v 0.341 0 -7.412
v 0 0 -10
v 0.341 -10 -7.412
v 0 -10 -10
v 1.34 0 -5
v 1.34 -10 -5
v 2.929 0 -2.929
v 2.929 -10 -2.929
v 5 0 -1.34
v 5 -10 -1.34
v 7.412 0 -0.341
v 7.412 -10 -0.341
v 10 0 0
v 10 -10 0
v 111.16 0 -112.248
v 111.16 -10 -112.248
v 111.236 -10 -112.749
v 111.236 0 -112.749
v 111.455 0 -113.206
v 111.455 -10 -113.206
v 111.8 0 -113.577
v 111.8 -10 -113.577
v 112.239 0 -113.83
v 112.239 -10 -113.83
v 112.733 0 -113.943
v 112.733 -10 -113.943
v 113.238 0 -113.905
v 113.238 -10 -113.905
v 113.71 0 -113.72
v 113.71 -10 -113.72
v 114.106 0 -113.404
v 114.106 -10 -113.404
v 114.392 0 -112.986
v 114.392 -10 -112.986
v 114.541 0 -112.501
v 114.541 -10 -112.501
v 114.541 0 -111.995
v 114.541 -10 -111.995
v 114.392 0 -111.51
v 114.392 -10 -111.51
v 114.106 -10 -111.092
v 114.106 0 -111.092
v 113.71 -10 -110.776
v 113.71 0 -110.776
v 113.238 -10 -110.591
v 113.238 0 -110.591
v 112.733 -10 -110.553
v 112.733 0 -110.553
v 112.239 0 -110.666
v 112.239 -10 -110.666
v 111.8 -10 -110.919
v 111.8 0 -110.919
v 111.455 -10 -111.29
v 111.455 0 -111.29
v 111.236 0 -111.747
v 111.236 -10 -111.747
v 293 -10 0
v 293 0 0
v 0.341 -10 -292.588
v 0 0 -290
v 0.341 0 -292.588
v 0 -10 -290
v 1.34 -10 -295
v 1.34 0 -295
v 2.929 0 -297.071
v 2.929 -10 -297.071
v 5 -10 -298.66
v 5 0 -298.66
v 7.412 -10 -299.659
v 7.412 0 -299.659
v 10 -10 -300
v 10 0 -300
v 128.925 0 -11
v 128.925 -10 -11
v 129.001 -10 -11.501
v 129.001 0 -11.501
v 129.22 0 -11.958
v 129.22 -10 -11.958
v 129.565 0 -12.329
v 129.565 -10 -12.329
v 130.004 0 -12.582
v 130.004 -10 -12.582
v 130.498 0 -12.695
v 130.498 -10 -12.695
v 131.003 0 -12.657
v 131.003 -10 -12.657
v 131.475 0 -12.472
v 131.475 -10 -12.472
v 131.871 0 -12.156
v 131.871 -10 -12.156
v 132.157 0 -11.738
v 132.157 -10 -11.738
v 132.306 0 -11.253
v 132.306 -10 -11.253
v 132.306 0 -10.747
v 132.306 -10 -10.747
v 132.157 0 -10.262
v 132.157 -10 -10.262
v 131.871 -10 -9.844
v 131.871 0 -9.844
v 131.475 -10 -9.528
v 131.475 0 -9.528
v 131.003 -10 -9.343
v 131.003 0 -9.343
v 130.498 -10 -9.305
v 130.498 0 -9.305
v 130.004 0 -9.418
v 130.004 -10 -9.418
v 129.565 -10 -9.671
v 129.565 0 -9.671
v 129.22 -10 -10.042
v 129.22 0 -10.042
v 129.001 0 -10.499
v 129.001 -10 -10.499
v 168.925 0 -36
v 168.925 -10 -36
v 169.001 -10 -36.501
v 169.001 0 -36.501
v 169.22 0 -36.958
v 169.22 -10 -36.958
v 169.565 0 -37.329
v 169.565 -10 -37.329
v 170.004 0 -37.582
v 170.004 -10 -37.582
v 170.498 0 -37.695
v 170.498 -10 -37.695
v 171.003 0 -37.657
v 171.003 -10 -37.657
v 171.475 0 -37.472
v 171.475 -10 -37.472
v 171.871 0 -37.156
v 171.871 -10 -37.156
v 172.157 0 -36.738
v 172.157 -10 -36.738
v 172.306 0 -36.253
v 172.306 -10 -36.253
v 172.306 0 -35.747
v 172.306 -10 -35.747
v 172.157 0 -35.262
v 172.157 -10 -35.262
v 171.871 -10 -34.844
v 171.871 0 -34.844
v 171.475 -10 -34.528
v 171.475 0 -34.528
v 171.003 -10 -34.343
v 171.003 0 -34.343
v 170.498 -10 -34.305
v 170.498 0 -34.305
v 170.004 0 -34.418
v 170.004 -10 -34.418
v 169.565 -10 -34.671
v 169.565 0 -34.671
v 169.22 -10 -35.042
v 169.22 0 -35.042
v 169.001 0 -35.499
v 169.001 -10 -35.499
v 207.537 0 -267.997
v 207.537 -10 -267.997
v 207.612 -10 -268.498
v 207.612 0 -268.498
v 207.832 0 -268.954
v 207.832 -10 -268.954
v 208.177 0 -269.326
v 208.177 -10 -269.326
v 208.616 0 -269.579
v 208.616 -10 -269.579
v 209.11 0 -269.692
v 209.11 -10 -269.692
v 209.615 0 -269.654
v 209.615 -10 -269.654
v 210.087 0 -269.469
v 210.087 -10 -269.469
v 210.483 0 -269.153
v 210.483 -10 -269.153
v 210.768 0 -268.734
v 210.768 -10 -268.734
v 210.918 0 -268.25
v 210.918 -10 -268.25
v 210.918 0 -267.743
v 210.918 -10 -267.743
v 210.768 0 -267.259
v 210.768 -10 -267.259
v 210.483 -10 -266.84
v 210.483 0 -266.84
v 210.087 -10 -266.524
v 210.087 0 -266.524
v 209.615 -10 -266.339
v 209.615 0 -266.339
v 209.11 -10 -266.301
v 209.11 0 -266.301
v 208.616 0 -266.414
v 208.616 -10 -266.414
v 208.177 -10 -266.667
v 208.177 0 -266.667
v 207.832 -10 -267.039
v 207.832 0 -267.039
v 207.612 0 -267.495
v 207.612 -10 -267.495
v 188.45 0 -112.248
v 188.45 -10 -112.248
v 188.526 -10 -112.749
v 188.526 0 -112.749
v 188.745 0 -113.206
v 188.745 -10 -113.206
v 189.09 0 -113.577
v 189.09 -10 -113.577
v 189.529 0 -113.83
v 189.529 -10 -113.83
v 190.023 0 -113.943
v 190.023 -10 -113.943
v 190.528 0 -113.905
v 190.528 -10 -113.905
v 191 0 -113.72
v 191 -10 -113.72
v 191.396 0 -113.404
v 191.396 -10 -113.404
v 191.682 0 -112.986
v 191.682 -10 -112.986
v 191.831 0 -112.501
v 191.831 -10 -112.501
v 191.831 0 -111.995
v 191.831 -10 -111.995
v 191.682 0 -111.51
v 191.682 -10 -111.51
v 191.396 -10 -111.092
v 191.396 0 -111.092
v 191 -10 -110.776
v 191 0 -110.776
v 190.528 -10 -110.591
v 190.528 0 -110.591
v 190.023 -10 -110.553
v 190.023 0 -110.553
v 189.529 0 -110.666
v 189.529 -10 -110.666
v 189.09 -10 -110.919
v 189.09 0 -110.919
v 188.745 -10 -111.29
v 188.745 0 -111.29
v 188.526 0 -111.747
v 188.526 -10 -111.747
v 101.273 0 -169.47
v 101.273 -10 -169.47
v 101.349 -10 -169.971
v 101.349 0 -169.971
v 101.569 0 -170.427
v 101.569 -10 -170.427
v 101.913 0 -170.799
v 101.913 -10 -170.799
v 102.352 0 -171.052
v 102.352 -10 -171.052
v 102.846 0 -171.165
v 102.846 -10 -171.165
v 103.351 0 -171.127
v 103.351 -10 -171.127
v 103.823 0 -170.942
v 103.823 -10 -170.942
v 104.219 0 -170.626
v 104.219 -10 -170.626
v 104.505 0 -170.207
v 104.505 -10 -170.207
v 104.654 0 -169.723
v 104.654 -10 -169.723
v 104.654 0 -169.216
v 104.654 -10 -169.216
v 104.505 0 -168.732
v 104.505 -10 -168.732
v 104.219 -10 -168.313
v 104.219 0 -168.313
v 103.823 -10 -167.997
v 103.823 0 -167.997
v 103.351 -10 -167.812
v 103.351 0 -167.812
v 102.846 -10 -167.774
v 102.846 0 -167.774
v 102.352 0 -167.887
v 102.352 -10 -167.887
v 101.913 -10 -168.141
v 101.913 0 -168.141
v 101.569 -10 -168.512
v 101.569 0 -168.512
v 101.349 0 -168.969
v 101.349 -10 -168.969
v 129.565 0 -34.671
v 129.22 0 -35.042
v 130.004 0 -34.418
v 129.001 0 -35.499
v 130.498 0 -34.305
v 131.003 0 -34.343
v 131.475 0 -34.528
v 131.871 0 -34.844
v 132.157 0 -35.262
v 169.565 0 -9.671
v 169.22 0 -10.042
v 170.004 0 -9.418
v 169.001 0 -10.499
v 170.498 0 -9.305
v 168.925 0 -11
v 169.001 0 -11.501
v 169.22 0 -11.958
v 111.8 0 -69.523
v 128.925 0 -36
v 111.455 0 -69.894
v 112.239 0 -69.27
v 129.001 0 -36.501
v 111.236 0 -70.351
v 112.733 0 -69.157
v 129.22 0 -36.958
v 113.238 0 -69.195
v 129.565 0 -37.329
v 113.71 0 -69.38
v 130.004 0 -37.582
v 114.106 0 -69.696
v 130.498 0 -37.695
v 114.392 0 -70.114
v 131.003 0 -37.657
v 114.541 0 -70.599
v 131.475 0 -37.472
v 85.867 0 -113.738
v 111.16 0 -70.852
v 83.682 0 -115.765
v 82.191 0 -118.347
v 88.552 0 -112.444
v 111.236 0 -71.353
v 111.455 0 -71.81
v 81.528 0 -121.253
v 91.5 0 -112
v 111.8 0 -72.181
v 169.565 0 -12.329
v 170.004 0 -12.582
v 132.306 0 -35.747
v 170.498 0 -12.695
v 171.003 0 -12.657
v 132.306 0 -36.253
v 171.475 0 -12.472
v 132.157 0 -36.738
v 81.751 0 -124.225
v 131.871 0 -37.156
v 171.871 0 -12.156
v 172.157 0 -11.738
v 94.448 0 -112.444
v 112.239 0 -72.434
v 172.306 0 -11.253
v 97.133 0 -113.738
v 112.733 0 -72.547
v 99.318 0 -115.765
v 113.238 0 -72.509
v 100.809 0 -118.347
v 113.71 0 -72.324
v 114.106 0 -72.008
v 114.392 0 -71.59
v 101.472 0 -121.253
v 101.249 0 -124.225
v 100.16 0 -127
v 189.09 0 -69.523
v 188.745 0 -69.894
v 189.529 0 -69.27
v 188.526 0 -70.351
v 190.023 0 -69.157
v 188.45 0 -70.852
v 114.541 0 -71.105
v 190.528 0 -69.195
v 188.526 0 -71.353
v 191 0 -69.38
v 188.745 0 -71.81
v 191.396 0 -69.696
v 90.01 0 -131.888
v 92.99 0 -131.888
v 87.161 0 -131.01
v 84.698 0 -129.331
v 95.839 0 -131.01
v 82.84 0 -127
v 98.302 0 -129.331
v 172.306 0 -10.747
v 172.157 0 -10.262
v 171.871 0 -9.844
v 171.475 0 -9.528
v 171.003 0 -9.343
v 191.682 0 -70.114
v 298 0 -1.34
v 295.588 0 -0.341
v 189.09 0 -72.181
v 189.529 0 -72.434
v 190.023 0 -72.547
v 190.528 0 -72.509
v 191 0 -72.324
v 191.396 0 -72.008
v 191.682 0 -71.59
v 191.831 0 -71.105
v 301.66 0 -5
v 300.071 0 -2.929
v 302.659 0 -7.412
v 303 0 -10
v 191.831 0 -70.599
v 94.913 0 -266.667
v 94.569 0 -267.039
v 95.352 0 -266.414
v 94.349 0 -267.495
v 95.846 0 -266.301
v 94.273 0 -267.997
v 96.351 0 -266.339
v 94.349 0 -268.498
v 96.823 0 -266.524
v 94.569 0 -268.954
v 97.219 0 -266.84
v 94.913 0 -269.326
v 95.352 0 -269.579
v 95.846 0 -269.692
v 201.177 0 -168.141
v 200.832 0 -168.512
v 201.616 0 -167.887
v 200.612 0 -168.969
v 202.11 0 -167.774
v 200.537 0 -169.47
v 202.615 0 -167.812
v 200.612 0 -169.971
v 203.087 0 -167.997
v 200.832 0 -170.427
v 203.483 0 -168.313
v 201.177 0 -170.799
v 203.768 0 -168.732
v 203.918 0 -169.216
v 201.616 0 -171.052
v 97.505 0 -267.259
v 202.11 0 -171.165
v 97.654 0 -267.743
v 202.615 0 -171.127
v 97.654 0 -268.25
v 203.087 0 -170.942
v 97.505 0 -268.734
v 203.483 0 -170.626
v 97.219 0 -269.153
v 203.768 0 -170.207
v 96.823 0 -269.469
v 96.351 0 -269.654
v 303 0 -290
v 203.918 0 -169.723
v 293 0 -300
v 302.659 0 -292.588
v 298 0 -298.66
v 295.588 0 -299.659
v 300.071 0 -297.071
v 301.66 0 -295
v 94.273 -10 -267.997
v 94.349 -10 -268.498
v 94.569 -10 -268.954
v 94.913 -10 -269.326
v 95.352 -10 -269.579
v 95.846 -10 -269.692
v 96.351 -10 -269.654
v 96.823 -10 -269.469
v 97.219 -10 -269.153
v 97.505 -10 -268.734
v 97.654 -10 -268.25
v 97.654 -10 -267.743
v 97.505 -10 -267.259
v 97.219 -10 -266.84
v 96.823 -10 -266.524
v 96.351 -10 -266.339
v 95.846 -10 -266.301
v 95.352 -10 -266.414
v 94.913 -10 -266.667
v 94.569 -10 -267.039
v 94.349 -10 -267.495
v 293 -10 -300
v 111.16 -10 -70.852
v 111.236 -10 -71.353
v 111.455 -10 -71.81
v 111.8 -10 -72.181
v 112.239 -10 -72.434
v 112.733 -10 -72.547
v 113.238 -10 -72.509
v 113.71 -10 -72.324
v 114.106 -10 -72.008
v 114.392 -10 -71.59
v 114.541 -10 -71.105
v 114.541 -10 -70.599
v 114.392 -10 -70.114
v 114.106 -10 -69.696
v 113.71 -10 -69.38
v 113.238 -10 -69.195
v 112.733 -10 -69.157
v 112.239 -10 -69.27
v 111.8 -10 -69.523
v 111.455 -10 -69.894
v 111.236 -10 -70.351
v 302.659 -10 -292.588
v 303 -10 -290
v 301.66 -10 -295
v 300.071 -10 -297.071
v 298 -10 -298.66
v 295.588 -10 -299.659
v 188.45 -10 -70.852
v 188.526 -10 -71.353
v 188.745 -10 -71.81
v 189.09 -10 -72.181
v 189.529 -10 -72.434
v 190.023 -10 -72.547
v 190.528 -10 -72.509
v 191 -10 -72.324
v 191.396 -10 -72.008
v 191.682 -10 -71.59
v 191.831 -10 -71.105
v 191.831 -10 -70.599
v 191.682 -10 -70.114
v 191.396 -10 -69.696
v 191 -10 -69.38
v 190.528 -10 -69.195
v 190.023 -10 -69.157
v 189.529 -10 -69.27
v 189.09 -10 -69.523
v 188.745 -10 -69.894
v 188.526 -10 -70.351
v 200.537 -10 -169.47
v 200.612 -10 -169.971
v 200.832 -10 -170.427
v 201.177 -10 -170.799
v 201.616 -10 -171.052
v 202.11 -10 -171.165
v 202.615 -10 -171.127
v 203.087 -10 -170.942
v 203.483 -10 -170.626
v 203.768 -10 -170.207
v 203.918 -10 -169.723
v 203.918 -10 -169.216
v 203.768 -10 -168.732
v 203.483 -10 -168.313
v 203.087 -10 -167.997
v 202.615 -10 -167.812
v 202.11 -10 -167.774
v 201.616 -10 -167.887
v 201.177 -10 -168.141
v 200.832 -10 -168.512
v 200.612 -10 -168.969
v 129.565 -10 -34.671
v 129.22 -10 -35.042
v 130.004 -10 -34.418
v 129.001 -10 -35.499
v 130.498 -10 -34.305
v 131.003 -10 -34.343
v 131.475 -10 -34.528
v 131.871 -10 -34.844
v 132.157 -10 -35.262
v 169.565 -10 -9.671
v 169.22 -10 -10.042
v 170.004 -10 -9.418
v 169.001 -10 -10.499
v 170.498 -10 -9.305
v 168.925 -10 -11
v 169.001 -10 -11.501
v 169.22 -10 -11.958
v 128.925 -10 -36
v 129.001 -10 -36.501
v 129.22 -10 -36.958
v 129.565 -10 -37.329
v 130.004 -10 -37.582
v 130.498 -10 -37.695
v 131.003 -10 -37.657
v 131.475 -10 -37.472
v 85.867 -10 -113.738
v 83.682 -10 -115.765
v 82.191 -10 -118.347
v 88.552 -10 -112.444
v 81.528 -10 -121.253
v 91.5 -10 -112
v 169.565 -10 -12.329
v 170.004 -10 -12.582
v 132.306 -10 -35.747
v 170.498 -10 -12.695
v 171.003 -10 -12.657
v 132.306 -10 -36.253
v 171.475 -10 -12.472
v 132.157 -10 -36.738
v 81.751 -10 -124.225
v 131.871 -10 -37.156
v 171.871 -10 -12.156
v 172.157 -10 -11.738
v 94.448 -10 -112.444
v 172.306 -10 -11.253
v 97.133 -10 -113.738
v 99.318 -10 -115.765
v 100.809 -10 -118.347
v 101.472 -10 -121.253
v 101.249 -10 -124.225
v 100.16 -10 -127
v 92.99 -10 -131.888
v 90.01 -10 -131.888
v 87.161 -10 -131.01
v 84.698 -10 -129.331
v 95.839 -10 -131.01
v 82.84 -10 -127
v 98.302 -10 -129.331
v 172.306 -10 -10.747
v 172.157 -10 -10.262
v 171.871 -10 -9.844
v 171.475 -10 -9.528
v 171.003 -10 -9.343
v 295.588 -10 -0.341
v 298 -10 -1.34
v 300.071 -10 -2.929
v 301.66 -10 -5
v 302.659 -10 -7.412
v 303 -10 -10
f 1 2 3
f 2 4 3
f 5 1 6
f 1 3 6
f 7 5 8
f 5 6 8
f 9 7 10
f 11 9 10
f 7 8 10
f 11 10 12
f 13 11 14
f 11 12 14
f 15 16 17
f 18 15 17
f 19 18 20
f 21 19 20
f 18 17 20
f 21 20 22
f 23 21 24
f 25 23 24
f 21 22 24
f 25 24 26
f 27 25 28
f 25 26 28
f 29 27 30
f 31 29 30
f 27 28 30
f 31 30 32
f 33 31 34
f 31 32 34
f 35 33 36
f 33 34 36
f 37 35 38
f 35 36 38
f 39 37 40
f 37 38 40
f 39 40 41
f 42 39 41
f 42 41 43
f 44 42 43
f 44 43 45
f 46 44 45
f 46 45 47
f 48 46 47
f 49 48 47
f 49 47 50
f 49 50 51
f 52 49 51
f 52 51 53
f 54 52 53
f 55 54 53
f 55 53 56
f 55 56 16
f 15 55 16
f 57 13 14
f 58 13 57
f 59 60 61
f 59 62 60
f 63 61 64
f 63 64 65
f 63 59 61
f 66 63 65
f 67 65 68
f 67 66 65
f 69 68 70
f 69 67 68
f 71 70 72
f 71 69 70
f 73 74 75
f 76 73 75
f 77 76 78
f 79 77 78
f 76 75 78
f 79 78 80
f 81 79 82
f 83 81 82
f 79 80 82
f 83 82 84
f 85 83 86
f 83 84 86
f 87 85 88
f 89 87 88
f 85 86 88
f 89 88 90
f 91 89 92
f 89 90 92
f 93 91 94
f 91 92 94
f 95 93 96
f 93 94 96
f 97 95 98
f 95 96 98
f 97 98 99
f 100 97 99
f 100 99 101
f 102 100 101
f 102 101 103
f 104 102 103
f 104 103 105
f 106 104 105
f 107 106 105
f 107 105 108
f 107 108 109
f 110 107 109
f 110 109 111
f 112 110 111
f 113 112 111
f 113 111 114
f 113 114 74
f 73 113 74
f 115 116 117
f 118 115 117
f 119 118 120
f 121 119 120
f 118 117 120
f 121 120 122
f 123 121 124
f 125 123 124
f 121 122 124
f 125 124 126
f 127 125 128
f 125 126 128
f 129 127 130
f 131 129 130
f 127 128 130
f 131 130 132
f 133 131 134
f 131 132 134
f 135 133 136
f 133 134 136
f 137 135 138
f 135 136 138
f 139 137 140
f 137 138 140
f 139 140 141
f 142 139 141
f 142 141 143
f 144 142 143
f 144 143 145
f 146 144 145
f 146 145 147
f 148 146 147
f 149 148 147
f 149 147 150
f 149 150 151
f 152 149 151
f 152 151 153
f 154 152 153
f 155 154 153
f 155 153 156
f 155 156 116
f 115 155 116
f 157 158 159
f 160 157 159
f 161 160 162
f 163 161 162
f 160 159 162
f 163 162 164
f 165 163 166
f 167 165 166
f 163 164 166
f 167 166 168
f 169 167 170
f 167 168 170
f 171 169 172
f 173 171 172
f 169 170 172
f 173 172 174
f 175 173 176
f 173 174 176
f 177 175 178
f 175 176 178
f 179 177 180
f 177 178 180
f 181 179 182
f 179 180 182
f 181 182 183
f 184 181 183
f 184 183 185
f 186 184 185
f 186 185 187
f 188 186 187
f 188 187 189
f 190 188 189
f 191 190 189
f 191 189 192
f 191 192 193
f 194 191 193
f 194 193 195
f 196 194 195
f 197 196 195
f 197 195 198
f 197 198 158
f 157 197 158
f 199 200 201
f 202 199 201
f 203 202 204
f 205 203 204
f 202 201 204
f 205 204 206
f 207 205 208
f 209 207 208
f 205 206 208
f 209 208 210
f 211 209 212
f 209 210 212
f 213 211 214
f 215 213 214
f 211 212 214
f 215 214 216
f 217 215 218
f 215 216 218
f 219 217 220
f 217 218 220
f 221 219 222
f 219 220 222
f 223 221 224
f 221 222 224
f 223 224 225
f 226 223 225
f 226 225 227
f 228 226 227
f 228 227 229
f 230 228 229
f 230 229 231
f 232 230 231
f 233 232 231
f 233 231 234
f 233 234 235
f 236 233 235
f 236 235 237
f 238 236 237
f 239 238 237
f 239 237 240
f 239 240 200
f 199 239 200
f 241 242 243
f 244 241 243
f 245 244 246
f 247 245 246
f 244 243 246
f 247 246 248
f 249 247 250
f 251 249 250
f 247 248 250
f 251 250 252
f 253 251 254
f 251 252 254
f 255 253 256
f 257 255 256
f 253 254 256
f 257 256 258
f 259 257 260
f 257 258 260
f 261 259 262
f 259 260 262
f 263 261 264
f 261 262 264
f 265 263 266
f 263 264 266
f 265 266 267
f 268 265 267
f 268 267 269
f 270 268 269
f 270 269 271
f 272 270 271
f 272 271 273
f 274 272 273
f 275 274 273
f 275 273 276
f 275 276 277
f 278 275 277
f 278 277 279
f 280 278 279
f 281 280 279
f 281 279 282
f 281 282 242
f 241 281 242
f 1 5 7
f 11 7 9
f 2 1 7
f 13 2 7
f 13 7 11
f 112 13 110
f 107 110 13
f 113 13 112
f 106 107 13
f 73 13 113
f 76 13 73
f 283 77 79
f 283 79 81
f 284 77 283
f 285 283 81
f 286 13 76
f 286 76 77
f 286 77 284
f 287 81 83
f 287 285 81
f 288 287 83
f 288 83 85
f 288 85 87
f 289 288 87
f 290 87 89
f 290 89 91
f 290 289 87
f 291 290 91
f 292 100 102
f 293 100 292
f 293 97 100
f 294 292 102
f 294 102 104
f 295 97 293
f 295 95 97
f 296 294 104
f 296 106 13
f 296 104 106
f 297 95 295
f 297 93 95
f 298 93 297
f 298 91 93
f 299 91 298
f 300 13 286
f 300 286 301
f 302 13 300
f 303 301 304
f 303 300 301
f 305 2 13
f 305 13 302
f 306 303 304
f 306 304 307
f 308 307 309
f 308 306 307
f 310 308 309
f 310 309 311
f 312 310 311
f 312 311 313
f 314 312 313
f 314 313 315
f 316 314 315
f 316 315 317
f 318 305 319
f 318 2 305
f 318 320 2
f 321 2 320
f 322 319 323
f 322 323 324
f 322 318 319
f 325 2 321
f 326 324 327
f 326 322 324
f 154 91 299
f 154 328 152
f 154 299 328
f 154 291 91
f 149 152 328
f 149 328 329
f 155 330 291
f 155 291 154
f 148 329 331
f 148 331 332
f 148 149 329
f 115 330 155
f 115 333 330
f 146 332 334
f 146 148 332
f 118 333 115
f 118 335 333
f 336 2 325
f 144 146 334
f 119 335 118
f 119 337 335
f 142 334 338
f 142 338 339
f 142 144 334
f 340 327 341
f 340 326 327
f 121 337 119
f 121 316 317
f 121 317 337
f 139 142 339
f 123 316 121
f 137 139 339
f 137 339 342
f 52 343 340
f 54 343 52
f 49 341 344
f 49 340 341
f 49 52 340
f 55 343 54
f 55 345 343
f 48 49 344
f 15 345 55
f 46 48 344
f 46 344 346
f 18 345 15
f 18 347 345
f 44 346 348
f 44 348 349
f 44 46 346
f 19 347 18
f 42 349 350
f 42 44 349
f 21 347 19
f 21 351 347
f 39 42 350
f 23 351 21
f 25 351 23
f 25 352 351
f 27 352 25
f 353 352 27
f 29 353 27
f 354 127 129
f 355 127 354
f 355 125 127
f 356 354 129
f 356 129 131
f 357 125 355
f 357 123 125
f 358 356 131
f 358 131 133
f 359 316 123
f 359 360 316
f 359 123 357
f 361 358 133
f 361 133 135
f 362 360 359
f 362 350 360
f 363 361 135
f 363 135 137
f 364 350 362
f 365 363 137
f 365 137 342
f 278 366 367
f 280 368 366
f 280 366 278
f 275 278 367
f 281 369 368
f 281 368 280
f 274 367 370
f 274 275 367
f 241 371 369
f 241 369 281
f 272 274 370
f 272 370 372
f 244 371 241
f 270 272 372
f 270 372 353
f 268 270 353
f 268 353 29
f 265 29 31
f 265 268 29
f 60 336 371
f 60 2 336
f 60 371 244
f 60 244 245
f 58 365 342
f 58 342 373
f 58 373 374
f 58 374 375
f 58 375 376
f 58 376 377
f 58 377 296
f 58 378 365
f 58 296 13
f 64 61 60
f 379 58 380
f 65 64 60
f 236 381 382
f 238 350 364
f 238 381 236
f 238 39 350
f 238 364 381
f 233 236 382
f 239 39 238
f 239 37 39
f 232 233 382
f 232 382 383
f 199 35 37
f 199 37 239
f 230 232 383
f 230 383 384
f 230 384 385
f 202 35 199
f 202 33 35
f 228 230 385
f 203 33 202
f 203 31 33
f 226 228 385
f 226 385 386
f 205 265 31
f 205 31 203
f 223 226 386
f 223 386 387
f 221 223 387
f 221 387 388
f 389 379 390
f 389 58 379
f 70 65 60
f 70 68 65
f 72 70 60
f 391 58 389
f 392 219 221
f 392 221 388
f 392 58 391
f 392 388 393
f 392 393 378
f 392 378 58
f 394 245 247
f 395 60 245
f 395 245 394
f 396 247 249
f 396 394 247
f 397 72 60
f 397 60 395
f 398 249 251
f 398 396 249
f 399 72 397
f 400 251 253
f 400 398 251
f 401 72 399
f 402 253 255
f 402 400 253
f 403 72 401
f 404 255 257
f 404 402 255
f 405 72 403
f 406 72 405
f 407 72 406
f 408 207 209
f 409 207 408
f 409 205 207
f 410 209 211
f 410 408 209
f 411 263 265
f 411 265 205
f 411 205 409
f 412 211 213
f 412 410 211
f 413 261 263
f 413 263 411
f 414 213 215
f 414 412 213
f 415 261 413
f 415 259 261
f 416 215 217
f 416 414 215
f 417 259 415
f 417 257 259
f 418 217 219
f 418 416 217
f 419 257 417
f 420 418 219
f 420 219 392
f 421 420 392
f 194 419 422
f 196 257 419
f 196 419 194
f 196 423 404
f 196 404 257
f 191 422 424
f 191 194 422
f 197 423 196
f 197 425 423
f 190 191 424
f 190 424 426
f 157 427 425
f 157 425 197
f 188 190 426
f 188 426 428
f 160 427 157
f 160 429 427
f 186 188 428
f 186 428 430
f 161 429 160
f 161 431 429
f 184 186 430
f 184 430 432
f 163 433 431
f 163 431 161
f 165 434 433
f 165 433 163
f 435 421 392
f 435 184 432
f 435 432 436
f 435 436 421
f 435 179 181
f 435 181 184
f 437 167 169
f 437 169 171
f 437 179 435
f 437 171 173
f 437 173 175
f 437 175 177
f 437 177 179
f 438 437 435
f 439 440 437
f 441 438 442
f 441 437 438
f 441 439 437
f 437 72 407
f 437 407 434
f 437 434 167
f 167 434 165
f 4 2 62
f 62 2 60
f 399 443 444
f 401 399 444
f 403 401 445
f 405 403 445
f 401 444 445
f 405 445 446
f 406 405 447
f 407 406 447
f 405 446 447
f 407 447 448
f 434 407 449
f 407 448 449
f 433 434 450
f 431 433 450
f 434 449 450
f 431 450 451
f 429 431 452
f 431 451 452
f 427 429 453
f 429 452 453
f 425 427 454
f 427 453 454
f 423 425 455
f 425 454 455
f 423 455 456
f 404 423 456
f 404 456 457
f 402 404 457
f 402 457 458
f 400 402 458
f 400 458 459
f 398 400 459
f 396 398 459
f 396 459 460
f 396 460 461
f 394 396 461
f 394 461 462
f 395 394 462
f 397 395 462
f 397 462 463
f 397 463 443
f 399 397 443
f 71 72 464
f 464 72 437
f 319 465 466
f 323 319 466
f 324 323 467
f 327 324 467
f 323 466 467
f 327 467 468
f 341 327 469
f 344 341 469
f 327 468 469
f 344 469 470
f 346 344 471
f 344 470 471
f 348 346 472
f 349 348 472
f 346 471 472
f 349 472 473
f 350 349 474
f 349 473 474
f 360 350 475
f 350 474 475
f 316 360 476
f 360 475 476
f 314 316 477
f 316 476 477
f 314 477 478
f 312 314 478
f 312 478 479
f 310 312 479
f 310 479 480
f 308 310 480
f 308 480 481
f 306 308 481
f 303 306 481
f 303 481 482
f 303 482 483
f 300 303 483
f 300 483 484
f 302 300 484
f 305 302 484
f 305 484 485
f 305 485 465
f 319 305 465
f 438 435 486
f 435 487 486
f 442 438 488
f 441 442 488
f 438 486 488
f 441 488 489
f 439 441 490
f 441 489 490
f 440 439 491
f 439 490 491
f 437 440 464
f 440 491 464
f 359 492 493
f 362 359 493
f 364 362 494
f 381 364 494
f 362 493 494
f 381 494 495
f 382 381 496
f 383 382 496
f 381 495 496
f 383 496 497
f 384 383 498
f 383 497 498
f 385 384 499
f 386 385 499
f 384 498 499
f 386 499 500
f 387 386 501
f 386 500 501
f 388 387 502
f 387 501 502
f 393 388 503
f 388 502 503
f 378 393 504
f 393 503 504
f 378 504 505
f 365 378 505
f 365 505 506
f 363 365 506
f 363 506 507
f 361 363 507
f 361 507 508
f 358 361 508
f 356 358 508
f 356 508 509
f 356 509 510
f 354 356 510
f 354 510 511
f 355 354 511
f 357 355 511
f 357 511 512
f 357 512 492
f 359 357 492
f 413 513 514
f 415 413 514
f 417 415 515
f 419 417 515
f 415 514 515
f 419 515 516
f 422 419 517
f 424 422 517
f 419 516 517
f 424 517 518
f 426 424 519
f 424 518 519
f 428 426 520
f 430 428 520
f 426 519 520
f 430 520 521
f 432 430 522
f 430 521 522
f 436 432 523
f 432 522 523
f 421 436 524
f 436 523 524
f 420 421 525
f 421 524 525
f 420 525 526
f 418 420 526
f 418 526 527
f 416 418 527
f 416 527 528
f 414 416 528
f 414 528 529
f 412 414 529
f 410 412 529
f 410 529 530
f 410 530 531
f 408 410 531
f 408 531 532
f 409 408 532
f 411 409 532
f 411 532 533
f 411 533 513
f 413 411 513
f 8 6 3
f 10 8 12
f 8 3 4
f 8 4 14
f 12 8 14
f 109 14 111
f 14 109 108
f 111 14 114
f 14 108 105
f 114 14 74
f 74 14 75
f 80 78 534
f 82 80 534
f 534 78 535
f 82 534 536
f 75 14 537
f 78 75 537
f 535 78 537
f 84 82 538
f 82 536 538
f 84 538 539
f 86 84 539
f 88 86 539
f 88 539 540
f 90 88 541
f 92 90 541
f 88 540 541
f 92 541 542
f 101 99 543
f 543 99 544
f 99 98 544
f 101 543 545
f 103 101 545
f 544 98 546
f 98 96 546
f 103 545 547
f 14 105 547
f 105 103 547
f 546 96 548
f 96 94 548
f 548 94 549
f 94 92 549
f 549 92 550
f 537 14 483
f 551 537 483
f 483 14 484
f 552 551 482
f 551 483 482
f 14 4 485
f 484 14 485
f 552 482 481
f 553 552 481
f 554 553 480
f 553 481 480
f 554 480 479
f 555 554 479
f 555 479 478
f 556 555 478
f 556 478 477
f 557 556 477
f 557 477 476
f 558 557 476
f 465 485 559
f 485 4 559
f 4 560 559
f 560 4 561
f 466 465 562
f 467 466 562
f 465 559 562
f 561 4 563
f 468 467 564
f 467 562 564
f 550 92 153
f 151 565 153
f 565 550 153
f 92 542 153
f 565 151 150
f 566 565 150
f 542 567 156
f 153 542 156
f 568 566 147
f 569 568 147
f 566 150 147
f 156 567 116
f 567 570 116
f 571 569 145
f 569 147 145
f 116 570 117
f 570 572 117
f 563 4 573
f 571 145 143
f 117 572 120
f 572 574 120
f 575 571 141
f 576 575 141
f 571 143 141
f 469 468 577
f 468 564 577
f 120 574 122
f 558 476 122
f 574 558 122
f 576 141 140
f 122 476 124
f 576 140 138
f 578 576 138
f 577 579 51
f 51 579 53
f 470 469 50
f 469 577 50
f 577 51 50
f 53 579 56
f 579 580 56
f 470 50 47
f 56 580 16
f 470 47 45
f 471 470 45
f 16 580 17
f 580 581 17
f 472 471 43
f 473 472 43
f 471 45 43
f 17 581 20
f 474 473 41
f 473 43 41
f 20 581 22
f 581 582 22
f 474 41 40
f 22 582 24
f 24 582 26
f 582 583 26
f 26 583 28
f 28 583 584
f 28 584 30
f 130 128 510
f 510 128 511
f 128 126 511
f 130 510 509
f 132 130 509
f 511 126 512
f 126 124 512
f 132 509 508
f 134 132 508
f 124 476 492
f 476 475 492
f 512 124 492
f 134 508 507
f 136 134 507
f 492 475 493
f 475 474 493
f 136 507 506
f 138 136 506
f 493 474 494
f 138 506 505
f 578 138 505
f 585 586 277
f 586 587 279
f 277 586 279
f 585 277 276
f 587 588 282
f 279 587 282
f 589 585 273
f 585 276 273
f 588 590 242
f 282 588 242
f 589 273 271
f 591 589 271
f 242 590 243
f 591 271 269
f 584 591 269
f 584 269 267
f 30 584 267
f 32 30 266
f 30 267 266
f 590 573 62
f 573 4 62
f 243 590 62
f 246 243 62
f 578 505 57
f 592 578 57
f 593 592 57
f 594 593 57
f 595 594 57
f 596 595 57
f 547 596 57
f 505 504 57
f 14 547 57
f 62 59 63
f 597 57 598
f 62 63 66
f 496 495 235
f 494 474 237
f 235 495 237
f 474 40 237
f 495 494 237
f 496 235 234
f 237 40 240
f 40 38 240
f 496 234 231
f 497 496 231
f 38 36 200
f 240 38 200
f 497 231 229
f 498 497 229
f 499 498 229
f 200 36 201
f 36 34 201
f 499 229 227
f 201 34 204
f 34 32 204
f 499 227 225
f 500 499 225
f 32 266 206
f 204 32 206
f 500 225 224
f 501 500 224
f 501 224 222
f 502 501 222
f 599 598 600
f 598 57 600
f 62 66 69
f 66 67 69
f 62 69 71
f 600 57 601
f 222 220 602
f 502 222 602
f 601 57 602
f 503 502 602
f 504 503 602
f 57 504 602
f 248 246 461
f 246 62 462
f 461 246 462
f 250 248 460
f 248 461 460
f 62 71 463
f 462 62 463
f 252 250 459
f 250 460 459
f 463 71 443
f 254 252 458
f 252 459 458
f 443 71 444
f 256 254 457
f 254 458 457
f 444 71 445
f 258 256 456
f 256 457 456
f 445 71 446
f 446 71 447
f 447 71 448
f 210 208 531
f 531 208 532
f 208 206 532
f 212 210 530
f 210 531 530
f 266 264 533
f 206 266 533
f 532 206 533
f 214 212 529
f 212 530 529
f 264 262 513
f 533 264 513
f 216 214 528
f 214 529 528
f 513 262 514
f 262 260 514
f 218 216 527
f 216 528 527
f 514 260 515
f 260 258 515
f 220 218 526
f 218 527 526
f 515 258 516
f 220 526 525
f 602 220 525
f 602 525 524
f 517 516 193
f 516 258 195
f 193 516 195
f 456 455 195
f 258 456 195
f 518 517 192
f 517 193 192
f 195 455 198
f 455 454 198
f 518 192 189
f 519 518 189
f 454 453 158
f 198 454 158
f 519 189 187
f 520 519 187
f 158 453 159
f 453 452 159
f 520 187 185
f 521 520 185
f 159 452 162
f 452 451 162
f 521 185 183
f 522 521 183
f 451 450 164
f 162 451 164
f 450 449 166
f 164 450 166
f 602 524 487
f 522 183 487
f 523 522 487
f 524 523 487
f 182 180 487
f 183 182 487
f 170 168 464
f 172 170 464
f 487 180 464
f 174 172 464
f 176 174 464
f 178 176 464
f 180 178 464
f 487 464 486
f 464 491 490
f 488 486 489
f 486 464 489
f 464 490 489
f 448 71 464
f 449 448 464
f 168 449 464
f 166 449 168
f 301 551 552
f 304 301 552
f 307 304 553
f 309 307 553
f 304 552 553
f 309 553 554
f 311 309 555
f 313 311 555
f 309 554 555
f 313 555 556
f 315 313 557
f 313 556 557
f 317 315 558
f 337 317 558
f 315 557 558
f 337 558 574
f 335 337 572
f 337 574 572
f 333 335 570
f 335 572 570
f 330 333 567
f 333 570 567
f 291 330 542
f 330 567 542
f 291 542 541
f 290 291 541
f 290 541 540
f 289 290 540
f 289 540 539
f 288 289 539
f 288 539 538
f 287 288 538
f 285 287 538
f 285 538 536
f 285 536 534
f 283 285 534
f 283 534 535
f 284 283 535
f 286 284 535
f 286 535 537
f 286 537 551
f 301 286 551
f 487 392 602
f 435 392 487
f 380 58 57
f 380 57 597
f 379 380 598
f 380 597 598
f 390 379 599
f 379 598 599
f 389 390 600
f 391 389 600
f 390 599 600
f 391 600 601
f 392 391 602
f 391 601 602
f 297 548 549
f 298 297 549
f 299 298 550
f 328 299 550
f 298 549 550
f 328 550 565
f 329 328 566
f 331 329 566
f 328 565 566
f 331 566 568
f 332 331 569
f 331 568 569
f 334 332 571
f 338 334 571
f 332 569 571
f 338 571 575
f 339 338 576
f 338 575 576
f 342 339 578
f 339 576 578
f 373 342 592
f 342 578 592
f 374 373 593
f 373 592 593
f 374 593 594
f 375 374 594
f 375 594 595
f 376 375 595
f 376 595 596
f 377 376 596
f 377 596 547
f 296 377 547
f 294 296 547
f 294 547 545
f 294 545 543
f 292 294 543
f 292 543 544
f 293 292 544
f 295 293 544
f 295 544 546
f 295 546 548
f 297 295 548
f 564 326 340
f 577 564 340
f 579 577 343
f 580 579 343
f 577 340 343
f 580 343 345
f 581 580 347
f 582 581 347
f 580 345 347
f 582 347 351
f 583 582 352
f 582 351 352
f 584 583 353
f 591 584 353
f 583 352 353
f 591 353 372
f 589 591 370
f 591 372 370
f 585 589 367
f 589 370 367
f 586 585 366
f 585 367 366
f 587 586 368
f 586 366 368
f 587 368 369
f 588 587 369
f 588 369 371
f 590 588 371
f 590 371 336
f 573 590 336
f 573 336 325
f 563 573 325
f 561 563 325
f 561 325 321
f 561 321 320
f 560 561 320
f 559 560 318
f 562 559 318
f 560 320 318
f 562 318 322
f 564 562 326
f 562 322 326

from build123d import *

# Parameters (mm, degrees)
SKETCH1_W                = 303
SKETCH1_H                = 300
BASE_FLANGE1_DEPTH       = 10
FILLET1_R                = 10
M3_CLEARANCE_HOLE1_D     = 3.4
M3_CLEARANCE_HOLE1_DEPTH = 50
M3_CLEARANCE_HOLE1_TIP   = 1.021463052
M3_CLEARANCE_HOLE2_D     = 3.4
M3_CLEARANCE_HOLE2_DEPTH = 28.71
M3_CLEARANCE_HOLE2_TIP   = 1.021463052
WIREHOLE_R               = 10
CUT_EXTRUDE1_DEPTH       = 10
M3_CLEARANCE_HOLE3_D     = 3.4
M3_CLEARANCE_HOLE3_DEPTH = 28.71
M3_CLEARANCE_HOLE3_TIP   = 1.021463052


# Sheet-metal steps are written as plain solids
with BuildPart() as part:
    # Sketch1 → Base-Flange1 (new body)
    with BuildSketch(Plane(origin=(0, 0, 0), x_dir=(1, 0, 0), z_dir=(0, 1, 0))):
        with Locations((151.5, 150)):
            Rectangle(SKETCH1_W, SKETCH1_H)
    extrude(amount=-BASE_FLANGE1_DEPTH)

    # Fillet1
    fillet1_edges = [part.edges().sort_by_distance(p)[0] for p in [
        (0, -5, -300),
        (303, -5, -300),
        (303, -5, 0),
        (0, -5, 0),
    ]]
    fillet(fillet1_edges, radius=FILLET1_R)

    # M3 Clearance Hole1
    with Locations(Plane(origin=(0, 0, 0), x_dir=(1, 0, 0), z_dir=(0, 1, 0))):
        with Locations((202.2366, 169.469739333), (102.9732, 169.469739333), (95.9732, 267.996539333), (209.2366, 267.996539333)):
            Hole(M3_CLEARANCE_HOLE1_D / 2, depth=M3_CLEARANCE_HOLE1_DEPTH)
            with Locations((0, 0, -(M3_CLEARANCE_HOLE1_DEPTH + M3_CLEARANCE_HOLE1_TIP / 2))):  # 118° drill point
                Cone(0, M3_CLEARANCE_HOLE1_D / 2, M3_CLEARANCE_HOLE1_TIP, mode=Mode.SUBTRACT)

    # M3 Clearance Hole2
    with Locations(Plane(origin=(0, 0, 0), x_dir=(1, 0, 0), z_dir=(0, 1, 0))):
        with Locations((130.625, 11), (170.625, 11), (130.625, 36), (170.625, 36)):
            Hole(M3_CLEARANCE_HOLE2_D / 2, depth=M3_CLEARANCE_HOLE2_DEPTH)
            with Locations((0, 0, -(M3_CLEARANCE_HOLE2_DEPTH + M3_CLEARANCE_HOLE2_TIP / 2))):  # 118° drill point
                Cone(0, M3_CLEARANCE_HOLE2_D / 2, M3_CLEARANCE_HOLE2_TIP, mode=Mode.SUBTRACT)

    # WireHole → Cut-Extrude1 (cut)
    with BuildSketch(Plane(origin=(0, 0, 0), x_dir=(1, 0, 0), z_dir=(0, 1, 0))):
        with Locations(Location((91.5, 122, 0), (0, 0, 270))):
            Circle(WIREHOLE_R)
    extrude(amount=-CUT_EXTRUDE1_DEPTH, mode=Mode.SUBTRACT)

    # M3 Clearance Hole3
    with Locations(Plane(origin=(0, 0, 0), x_dir=(1, 0, 0), z_dir=(0, 1, 0))):
        with Locations((190.15, 70.852), (190.15, 112.248), (112.86, 70.852), (112.86, 112.248)):
            Hole(M3_CLEARANCE_HOLE3_D / 2, depth=M3_CLEARANCE_HOLE3_DEPTH)
            with Locations((0, 0, -(M3_CLEARANCE_HOLE3_DEPTH + M3_CLEARANCE_HOLE3_TIP / 2))):  # 118° drill point
                Cone(0, M3_CLEARANCE_HOLE3_D / 2, M3_CLEARANCE_HOLE3_TIP, mode=Mode.SUBTRACT)


solid = part.part
